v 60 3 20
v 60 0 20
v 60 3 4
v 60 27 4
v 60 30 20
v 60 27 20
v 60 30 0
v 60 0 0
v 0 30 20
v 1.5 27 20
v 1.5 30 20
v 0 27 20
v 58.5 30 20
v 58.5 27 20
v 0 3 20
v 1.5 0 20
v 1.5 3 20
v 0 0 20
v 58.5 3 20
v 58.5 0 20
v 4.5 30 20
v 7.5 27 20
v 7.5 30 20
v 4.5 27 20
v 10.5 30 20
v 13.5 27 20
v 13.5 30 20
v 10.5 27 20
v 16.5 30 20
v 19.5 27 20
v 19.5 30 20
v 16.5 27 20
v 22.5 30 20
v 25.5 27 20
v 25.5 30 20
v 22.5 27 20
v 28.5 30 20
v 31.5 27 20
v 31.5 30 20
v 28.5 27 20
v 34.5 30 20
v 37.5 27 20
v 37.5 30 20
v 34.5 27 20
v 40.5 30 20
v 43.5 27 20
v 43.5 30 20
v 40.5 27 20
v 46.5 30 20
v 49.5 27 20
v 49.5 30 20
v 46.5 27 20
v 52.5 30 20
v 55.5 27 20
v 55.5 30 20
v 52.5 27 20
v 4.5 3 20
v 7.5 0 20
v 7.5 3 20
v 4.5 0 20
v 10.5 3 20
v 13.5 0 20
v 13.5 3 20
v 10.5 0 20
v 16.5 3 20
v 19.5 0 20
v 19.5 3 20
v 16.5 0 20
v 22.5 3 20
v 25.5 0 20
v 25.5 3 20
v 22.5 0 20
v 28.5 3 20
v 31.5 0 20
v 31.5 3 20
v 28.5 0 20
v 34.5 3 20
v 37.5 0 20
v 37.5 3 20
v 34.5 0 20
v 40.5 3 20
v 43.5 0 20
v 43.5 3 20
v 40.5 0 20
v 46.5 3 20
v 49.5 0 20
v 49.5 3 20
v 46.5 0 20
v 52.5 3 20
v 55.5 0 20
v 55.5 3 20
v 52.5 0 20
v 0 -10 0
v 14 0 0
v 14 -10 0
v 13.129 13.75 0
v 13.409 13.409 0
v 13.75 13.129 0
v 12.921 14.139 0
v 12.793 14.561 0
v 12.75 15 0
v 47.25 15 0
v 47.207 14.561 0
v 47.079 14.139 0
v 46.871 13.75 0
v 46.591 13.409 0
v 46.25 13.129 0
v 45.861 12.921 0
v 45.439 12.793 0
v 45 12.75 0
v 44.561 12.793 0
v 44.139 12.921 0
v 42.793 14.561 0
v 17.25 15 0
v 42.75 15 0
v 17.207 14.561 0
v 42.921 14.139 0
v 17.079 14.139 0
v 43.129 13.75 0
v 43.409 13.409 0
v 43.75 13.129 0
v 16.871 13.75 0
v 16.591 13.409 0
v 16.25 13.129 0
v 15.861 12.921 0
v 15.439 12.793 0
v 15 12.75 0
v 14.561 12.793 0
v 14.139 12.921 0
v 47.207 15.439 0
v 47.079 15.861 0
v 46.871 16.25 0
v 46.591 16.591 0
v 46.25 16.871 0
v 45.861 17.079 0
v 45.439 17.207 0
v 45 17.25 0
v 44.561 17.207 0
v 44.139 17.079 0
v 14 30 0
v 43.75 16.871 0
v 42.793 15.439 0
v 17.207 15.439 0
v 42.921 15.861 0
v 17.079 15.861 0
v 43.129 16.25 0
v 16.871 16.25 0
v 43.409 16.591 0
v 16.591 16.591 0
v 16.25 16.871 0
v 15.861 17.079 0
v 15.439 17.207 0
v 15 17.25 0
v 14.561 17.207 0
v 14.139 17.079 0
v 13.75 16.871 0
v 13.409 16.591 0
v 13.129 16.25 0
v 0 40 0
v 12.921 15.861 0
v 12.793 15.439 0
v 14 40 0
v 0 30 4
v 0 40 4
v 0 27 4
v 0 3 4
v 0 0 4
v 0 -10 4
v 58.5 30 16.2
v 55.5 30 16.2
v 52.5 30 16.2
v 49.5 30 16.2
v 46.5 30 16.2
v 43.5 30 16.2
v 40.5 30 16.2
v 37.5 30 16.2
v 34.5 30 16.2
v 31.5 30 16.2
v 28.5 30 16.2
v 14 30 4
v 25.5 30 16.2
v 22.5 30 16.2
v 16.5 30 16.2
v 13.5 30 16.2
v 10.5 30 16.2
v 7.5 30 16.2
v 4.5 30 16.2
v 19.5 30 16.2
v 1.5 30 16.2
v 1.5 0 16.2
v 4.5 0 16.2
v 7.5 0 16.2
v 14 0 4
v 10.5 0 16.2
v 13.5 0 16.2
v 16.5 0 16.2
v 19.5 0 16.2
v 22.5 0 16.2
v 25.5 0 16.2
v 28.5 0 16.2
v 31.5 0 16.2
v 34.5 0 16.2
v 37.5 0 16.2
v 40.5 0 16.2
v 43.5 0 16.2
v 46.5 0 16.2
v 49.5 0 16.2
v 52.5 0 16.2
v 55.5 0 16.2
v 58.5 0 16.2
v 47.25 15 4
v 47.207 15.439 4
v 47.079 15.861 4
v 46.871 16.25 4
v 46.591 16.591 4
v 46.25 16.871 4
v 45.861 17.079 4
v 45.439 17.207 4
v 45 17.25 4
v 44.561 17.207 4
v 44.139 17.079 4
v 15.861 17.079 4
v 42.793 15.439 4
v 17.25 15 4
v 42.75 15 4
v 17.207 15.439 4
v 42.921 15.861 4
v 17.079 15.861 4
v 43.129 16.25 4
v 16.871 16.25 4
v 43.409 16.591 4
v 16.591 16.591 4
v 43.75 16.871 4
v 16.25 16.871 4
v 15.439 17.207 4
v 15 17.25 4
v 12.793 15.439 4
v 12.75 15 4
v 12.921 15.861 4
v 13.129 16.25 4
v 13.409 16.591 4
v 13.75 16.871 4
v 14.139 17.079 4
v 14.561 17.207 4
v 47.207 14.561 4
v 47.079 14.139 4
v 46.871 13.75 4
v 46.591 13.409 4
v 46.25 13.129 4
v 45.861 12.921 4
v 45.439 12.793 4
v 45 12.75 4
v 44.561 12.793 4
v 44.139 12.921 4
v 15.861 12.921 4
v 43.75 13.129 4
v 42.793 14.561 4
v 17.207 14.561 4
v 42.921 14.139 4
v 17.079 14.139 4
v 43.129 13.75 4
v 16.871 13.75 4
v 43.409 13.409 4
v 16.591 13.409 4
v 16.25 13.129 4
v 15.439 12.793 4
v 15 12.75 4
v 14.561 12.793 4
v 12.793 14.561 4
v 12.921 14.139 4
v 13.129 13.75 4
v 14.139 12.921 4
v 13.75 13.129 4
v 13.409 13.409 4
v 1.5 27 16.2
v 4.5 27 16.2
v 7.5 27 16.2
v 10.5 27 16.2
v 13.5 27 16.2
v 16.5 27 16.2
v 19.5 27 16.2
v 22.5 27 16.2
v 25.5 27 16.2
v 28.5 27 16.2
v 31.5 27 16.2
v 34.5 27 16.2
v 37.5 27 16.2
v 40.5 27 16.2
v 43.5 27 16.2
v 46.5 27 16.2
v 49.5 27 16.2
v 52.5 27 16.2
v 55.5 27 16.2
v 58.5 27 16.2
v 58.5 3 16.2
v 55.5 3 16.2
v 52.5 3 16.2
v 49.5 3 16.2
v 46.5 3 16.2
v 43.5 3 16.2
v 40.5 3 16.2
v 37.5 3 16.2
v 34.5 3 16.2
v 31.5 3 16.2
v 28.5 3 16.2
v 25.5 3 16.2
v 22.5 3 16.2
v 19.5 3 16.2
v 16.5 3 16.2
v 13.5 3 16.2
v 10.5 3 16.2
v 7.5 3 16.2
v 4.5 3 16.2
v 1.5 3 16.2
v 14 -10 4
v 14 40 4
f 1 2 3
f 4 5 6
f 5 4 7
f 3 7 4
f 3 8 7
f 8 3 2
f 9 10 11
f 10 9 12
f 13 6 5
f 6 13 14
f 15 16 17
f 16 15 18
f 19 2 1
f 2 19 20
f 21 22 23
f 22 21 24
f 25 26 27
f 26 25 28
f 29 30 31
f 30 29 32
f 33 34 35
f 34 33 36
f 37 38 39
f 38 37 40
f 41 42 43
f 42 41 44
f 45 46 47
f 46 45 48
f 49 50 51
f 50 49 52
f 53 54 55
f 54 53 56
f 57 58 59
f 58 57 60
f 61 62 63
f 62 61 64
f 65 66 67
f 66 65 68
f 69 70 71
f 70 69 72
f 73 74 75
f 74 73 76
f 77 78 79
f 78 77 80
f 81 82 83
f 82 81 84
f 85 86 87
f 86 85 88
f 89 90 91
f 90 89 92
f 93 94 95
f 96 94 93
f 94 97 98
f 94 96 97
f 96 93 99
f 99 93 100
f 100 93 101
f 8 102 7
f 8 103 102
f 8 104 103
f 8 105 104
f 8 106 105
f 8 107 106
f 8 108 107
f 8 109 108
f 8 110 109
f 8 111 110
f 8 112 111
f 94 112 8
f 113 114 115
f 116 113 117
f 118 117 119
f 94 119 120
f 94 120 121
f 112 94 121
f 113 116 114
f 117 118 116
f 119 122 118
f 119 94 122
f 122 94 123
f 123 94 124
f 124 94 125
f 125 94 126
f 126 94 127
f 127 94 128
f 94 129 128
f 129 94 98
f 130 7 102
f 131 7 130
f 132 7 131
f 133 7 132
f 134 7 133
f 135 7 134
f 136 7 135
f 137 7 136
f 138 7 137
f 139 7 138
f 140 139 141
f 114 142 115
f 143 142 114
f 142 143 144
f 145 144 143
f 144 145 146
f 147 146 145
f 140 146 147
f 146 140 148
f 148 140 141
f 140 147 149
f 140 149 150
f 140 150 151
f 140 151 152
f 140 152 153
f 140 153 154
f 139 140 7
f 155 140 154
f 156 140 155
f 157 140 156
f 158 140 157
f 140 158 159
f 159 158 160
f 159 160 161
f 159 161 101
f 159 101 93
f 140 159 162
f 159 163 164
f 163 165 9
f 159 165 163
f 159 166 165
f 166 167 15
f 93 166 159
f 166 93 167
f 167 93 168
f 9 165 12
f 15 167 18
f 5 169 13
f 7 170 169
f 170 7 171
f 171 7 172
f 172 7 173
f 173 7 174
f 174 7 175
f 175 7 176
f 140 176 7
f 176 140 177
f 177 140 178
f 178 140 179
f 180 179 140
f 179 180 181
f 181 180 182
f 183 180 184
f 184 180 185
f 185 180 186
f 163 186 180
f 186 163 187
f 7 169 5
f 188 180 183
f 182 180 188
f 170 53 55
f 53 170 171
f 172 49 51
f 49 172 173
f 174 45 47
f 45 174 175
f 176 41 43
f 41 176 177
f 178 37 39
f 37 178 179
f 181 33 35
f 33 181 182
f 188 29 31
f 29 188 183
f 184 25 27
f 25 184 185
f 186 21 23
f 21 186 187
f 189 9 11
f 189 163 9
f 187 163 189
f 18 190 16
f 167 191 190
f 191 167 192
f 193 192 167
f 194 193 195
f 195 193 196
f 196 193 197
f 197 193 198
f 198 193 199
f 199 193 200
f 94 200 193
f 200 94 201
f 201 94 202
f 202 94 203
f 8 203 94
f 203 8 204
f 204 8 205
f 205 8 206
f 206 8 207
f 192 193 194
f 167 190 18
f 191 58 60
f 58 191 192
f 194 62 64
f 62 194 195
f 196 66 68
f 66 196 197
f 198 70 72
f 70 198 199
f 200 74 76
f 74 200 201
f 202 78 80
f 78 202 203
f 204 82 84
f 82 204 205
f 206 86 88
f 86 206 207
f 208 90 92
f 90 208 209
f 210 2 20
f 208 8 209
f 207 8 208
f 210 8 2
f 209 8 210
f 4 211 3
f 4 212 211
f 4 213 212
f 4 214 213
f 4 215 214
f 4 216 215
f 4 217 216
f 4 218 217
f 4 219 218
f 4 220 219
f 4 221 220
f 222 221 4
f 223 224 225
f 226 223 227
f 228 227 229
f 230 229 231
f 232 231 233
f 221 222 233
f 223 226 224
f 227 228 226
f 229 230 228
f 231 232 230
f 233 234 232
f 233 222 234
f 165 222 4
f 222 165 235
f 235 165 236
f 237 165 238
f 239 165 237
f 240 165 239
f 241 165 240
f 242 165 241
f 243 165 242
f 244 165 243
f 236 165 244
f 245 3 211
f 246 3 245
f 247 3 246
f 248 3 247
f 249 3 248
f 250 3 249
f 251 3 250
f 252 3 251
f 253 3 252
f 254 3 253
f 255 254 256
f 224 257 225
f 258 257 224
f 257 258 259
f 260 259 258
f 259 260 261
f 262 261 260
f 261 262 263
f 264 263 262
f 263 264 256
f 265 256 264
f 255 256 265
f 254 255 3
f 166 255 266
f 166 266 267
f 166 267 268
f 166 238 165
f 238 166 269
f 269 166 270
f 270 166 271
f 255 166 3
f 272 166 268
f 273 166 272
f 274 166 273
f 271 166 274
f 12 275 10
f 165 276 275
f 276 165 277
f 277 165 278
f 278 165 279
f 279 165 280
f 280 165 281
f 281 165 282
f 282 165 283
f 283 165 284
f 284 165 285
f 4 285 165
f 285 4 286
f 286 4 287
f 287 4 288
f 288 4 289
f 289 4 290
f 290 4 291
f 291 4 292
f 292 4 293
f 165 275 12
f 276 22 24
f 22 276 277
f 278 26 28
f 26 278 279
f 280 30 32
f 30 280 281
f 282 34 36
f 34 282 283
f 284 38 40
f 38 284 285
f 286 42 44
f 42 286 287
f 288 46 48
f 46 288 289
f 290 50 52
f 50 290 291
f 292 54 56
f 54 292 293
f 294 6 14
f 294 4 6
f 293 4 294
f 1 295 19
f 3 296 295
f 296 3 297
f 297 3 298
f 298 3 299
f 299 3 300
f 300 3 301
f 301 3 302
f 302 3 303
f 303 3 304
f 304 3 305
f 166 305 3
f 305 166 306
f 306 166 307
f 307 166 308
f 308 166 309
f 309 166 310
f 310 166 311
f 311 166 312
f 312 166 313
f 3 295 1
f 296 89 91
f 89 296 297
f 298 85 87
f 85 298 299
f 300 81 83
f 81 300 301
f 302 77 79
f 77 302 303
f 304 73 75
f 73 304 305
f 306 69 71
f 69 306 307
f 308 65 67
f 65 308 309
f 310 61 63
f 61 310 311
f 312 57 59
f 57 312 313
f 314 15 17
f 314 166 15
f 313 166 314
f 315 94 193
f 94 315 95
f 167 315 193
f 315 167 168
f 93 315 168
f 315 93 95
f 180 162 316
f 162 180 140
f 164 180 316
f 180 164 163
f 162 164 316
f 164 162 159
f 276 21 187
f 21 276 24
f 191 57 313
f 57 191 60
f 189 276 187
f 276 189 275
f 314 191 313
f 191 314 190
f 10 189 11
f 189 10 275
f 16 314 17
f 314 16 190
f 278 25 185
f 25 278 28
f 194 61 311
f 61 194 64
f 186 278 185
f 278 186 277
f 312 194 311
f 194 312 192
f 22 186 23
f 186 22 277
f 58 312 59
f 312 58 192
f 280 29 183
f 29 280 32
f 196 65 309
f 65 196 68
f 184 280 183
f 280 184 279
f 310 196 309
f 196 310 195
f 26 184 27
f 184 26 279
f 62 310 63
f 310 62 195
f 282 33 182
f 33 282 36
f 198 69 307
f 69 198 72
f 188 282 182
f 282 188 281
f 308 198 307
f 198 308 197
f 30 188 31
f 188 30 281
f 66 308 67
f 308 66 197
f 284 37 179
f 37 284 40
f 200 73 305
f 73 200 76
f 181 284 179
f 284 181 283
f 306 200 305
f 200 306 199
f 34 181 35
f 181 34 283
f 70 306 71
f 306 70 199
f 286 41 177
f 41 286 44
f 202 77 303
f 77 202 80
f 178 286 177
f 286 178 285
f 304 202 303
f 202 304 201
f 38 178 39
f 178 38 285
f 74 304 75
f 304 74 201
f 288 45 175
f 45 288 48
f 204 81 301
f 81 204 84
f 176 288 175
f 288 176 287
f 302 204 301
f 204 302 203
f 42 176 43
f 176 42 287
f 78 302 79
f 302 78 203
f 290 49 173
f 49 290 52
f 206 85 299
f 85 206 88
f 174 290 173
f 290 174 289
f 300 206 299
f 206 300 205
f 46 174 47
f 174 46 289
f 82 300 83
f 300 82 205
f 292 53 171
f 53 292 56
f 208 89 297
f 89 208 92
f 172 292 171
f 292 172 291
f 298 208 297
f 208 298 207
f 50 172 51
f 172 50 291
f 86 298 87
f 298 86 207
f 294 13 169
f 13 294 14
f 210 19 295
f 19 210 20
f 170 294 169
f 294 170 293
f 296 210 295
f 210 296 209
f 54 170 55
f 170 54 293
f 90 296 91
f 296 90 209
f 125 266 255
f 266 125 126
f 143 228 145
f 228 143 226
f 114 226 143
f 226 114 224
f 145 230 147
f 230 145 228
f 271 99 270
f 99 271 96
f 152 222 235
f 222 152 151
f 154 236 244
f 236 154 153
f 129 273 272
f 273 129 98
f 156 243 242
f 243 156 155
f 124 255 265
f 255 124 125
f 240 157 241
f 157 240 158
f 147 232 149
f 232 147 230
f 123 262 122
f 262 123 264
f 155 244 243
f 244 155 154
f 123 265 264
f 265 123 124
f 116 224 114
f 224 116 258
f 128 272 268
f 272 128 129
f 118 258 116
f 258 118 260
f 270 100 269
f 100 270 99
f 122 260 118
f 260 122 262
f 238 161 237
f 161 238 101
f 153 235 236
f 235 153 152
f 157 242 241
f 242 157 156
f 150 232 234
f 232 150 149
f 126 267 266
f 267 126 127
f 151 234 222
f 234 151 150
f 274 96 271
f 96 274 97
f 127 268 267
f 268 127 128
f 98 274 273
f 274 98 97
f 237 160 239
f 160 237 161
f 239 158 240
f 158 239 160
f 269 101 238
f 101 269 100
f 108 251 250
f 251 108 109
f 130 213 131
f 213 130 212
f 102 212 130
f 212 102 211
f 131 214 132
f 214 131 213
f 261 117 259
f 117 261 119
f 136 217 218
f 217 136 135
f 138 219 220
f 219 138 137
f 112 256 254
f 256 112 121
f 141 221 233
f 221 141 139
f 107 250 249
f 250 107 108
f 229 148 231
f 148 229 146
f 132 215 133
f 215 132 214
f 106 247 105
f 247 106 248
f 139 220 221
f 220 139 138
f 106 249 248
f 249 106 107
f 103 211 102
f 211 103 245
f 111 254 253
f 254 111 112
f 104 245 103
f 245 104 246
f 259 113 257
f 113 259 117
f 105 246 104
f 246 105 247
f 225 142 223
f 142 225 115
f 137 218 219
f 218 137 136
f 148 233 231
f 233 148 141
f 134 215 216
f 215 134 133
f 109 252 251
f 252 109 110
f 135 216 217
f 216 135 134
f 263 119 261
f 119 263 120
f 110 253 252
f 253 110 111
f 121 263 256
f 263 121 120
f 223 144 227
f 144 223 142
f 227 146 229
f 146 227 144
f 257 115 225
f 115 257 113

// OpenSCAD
$fn = 32;

// ----------------------------------------------------------------------
// Cable duct: 60 x 30 x 20 mm, 10 fingers
// ----------------------------------------------------------------------

// --- parameters (mm) ---
channel_l = 60;           // duct length, X
channel_w = 30;           // duct width, Y
channel_h = 20;           // duct height, Z
channel_t = 3;            // side wall thickness
floor_t = 4;              // floor thickness
slot_w = 3;               // finger slot width
slot_h = 12.2;            // finger slot height
fingers = 10;             // number of finger slots per side
pitch = 6;                // finger pitch
hole_d = 4.5;             // floor mounting hole
hole_n = 2;               // mounting holes in the floor
ear_w = 11;               // mounting ear width
ear_l = 14;               // mounting ear length

module shell() {
  difference() {
    cube([channel_l, channel_w, channel_h]);
    /* open top channel */
    translate([-channel_t - 1, channel_t, floor_t])
      cube([channel_l + 2 * channel_t + 2, channel_w - 2 * channel_t, channel_h + 1]);
  }
}

module ears() {
  translate([0, -ear_w + 1, 0]) cube([ear_l, ear_w, floor_t]);
  translate([0, channel_w - 1, 0]) cube([ear_l, ear_w, floor_t]);
}

difference() {
  union() {
    shell();
    ears();
  }
  /* finger slots cut through both side walls */
  for (i = [0 : fingers - 1]) translate([pitch / 2 + i * pitch - slot_w / 2, -1, floor_t + slot_h]) cube([slot_w, channel_w + 2, channel_h]);
  for (i = [0 : hole_n - 1]) translate([(channel_l / hole_n) * (i + 0.5), channel_w / 2, -1]) cylinder(h = floor_t + 2, d = hole_d);
}
